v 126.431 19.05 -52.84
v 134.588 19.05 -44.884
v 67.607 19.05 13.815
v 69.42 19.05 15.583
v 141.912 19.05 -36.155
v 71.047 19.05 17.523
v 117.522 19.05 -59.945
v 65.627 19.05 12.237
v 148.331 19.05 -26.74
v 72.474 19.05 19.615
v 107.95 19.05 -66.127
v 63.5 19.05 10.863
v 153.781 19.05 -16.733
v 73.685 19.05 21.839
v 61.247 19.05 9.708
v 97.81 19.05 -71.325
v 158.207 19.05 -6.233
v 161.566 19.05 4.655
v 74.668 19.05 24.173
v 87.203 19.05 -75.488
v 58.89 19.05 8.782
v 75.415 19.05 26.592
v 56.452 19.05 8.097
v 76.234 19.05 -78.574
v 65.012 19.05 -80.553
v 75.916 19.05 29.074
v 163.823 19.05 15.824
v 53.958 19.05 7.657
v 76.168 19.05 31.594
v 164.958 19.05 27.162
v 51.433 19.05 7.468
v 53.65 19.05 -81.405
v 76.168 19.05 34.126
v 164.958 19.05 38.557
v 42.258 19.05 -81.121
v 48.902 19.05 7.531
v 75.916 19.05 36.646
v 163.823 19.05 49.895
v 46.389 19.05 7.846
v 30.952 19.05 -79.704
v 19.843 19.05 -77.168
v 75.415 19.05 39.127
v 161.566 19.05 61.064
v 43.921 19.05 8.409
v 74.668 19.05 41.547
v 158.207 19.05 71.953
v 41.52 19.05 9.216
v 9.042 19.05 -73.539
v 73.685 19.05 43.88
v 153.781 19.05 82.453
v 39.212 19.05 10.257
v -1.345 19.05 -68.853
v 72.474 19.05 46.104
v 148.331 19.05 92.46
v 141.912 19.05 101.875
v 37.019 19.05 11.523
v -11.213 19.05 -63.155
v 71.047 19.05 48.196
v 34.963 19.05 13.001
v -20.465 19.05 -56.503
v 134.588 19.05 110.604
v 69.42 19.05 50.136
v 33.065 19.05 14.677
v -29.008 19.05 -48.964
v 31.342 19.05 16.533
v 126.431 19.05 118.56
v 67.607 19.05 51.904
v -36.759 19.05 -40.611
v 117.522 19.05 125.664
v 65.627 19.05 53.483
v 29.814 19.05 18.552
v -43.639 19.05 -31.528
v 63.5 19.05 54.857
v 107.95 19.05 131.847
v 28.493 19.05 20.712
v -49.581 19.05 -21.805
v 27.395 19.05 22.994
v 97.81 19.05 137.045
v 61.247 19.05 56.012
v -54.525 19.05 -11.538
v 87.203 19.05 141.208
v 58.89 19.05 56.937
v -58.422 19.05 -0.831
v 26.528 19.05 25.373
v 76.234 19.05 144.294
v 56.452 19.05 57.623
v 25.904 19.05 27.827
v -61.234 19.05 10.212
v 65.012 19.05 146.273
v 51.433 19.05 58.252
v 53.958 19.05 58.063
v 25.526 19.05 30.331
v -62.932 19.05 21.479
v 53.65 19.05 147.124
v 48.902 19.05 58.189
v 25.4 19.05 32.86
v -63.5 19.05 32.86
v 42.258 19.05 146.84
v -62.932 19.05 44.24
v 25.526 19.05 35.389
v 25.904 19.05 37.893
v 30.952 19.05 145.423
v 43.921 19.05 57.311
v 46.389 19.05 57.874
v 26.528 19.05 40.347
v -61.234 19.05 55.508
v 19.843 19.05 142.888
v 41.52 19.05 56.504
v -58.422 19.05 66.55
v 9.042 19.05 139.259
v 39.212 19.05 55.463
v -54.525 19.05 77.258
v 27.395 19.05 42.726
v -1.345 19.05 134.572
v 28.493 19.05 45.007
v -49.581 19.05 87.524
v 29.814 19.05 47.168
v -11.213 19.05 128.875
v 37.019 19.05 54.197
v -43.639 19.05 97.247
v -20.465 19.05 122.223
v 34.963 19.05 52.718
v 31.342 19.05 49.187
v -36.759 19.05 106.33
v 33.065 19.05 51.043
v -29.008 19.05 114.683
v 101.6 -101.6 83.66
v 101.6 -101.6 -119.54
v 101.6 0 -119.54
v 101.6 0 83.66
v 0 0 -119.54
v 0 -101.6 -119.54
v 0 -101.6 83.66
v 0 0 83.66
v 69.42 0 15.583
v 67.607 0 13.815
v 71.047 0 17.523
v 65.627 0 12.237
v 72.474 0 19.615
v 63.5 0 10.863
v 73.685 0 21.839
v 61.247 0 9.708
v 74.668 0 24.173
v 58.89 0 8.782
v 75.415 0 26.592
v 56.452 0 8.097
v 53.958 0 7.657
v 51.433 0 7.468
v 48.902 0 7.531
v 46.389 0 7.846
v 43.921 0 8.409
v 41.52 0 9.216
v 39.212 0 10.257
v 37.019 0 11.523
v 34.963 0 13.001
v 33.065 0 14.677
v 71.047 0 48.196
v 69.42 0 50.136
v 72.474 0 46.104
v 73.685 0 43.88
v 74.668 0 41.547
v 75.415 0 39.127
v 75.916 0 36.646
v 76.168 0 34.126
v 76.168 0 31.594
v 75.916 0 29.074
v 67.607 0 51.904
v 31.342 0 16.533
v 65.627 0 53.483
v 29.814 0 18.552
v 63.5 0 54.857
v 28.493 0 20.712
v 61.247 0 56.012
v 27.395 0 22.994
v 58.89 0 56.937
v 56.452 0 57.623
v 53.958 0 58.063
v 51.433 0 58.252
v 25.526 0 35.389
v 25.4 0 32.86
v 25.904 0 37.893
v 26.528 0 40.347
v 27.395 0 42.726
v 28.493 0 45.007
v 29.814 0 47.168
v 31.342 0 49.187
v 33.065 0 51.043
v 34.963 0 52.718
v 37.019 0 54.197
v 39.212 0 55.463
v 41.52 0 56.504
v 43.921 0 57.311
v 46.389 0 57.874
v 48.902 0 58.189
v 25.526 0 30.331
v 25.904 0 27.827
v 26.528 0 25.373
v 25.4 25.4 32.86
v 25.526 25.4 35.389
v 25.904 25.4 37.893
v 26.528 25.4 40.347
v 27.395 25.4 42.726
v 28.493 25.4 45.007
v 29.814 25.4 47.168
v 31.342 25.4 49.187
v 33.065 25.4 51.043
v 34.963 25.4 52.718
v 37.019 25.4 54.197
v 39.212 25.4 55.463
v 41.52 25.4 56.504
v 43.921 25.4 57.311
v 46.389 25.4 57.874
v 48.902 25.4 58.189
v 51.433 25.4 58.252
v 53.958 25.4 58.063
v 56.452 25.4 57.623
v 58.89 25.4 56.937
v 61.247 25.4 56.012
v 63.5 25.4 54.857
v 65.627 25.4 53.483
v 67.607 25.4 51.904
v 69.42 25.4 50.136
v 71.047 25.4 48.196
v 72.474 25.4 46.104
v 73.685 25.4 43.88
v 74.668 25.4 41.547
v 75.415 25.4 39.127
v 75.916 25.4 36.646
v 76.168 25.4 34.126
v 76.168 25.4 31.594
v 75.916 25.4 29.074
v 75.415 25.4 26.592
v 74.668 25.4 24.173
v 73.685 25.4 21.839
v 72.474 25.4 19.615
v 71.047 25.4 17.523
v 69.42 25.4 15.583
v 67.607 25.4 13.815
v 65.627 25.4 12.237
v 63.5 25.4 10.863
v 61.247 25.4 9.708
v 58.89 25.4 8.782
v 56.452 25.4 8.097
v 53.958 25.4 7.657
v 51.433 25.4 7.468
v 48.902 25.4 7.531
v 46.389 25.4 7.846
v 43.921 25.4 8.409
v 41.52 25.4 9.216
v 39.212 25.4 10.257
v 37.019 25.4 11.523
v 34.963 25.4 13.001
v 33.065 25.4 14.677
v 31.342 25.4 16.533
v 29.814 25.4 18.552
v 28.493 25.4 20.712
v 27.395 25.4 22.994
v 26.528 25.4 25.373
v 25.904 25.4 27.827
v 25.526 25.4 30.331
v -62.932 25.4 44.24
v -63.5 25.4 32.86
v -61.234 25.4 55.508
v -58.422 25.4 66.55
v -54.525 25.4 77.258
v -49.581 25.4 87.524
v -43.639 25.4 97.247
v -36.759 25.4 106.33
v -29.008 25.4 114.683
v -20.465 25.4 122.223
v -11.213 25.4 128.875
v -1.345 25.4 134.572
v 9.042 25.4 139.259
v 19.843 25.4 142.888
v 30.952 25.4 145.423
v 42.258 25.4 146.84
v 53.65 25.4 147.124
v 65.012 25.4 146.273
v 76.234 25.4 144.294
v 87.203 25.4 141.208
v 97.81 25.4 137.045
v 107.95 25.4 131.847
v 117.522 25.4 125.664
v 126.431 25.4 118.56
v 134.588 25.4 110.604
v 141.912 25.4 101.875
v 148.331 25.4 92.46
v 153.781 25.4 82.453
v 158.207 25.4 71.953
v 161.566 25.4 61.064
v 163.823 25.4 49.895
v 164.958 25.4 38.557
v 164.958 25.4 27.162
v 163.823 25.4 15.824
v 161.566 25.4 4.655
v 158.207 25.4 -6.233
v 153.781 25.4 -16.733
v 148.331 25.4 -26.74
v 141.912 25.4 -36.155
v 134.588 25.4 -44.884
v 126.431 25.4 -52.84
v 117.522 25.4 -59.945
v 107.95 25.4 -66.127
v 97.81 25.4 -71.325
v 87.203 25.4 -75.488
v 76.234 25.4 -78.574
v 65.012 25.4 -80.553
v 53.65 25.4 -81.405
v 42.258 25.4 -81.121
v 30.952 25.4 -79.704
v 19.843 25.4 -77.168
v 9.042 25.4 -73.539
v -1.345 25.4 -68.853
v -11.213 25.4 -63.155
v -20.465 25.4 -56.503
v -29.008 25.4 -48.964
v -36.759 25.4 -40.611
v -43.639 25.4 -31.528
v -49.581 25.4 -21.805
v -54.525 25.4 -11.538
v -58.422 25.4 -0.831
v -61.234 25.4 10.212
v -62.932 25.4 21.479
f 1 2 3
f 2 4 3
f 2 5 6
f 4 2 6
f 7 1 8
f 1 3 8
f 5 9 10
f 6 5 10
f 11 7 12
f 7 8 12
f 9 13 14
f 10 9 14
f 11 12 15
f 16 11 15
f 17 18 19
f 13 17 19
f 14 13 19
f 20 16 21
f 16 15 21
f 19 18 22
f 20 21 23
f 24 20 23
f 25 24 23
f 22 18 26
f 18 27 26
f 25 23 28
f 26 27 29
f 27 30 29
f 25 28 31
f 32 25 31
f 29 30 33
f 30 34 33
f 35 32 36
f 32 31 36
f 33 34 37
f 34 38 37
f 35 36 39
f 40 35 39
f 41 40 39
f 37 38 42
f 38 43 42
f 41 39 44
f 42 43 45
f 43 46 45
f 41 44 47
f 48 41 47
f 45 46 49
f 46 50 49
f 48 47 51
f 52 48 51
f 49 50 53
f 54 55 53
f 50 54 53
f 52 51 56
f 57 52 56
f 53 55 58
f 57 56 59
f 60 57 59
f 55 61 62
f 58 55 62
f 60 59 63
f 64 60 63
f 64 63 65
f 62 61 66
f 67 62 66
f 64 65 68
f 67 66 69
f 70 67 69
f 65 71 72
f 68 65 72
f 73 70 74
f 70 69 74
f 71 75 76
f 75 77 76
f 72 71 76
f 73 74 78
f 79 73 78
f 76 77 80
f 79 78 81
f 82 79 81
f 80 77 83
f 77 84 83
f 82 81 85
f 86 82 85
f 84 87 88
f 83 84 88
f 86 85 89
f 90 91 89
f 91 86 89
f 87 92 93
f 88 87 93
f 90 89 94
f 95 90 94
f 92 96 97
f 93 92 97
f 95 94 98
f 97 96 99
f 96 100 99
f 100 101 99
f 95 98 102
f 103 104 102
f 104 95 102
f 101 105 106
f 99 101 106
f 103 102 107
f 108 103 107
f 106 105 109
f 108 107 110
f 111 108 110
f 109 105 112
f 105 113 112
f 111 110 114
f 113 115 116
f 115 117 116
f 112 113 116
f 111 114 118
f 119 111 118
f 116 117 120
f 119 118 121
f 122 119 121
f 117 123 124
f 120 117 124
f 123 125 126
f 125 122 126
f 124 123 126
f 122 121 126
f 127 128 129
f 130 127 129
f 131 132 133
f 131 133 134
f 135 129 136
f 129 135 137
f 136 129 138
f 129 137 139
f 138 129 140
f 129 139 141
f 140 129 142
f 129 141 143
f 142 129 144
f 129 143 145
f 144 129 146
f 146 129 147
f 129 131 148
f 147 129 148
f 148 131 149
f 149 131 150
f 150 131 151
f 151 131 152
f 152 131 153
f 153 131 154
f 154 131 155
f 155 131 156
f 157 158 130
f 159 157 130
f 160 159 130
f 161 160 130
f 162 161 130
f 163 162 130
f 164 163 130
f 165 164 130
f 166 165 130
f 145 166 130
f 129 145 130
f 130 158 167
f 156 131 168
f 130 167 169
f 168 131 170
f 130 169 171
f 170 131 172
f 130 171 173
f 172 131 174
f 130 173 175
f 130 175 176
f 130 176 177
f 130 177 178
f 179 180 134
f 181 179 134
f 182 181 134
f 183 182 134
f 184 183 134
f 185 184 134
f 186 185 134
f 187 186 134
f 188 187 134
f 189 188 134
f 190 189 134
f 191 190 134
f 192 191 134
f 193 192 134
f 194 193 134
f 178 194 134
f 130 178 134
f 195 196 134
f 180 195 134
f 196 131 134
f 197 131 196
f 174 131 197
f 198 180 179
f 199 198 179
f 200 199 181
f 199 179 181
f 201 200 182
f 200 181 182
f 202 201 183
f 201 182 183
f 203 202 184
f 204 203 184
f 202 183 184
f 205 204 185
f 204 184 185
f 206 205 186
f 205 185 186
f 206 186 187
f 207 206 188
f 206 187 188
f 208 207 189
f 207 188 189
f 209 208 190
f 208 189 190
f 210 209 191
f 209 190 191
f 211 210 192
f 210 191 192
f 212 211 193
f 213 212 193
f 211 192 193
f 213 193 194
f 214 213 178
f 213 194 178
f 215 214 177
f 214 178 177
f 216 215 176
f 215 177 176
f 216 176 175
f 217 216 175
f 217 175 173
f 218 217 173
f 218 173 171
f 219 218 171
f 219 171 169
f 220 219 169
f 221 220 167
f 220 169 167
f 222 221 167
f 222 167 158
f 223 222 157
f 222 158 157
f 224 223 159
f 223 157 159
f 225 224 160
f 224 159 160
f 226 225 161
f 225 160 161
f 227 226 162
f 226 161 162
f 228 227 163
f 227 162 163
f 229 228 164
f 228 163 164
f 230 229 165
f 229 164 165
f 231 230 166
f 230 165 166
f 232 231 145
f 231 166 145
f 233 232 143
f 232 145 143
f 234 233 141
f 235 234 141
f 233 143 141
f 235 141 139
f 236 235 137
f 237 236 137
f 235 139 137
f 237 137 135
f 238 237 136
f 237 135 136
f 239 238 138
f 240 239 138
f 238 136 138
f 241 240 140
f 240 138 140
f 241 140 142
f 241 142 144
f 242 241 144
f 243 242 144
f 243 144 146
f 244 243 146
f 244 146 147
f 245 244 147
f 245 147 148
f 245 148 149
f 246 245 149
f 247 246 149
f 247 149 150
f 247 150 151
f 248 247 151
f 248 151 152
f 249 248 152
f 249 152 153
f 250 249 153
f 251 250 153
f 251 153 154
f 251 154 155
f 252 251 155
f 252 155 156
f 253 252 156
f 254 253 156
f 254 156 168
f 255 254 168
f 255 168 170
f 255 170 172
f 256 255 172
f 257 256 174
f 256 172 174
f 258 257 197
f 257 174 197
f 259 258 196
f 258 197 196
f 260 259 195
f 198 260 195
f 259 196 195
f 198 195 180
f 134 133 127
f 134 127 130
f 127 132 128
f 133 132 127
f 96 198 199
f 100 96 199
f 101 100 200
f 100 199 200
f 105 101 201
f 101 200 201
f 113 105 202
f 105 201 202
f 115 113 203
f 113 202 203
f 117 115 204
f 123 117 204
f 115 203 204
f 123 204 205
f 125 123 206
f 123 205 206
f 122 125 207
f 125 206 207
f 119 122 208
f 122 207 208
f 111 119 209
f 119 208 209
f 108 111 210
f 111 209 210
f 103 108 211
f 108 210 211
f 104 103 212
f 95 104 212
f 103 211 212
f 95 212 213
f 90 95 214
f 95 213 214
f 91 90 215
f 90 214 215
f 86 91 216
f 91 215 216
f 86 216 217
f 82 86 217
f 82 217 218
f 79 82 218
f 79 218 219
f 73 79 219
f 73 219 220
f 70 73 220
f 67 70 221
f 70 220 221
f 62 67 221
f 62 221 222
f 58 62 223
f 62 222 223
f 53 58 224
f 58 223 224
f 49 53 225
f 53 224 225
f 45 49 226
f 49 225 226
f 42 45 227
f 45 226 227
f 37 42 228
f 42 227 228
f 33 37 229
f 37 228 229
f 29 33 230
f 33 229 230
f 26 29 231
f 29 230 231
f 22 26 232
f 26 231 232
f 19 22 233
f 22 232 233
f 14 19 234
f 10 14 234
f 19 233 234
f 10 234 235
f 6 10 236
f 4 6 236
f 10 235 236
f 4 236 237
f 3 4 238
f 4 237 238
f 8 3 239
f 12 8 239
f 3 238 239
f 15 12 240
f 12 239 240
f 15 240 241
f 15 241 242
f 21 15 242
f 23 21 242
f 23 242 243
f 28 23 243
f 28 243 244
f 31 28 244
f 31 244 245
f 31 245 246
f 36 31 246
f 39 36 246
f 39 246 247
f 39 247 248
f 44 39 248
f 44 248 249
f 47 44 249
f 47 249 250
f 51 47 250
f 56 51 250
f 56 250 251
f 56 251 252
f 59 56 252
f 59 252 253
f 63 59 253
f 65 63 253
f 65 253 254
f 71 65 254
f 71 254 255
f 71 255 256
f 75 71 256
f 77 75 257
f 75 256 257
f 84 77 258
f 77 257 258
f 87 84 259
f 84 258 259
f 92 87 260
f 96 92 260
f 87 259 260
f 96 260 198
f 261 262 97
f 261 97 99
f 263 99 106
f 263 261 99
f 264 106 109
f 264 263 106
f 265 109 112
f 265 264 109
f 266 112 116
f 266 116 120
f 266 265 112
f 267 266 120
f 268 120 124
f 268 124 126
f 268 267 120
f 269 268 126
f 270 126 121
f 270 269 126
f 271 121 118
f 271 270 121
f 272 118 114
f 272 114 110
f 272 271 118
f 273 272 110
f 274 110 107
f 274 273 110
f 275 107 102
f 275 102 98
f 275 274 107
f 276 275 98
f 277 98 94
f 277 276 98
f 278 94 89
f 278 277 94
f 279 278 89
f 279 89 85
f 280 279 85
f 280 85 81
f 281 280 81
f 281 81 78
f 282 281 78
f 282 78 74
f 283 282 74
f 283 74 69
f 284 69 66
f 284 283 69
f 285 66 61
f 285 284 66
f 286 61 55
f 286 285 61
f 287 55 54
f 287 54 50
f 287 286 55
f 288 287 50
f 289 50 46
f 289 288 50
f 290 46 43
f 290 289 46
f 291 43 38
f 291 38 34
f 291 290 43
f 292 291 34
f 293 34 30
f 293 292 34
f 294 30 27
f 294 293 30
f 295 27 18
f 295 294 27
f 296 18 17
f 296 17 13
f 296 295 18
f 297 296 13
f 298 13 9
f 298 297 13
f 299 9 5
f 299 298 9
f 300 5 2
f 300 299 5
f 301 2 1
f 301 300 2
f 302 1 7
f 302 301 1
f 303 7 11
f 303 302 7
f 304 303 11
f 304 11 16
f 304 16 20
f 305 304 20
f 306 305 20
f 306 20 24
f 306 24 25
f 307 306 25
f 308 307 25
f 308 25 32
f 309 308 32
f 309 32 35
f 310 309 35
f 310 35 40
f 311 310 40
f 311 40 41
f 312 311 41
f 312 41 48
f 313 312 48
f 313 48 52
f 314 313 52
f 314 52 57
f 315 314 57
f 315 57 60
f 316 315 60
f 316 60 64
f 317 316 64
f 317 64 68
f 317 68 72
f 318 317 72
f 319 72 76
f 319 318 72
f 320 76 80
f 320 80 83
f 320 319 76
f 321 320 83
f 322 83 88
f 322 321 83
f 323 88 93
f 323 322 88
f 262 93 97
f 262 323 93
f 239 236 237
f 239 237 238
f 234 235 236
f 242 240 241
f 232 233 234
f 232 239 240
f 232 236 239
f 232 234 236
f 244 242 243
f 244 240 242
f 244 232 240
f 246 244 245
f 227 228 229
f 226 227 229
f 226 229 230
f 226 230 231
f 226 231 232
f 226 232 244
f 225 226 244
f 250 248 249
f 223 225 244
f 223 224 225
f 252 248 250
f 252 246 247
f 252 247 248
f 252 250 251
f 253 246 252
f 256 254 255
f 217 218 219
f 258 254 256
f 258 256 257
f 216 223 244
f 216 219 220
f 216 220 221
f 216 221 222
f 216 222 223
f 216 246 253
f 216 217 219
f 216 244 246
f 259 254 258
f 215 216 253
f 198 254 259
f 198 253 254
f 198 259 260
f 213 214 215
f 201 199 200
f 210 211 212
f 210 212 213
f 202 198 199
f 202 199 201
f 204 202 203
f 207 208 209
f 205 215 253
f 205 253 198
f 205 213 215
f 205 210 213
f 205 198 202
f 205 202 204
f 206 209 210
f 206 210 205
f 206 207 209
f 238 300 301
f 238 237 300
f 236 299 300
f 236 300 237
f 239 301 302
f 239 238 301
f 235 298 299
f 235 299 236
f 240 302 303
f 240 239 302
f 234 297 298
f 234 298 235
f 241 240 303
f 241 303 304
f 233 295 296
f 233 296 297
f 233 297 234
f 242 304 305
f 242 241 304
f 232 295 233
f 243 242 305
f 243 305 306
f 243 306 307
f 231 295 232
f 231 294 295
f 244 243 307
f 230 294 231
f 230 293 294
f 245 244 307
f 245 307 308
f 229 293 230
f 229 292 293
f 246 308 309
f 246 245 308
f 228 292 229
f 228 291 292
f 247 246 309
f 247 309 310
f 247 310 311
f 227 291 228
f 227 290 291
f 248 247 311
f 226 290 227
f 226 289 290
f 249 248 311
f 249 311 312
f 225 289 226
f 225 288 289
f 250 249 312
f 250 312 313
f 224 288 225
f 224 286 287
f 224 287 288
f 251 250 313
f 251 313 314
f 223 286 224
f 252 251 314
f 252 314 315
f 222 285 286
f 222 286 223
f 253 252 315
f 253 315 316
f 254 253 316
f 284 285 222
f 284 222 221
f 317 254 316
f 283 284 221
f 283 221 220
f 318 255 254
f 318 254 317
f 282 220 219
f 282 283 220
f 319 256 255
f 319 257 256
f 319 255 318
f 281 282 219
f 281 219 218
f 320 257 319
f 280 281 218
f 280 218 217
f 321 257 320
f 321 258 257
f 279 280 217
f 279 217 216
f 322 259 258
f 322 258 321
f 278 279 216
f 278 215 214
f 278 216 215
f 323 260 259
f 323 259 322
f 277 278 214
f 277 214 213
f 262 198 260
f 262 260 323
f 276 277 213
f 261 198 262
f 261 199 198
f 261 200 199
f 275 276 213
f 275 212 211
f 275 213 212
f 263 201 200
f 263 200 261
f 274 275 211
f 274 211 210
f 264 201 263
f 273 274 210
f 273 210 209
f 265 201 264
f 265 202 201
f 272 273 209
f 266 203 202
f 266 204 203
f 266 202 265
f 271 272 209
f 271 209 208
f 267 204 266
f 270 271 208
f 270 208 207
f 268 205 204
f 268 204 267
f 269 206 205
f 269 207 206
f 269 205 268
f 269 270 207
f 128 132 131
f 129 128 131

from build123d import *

# Parameters (mm, degrees)
F0_W     = 101.6
F0_H     = 203.2
F1_DEPTH = 101.6
F2_R     = 25.4
F3_DEPTH = 25.4
F4_R     = 114.3
F4_R_2   = 25.4
F5_DEPTH = 6.35


with BuildPart() as f1:
    # F0 (on Right) → F1 (new body)
    with BuildSketch(Plane.YZ):
        with Locations((-50.8, -17.940154)):
            Rectangle(F0_W, F0_H)
    extrude(amount=F1_DEPTH)

    # F2 (on face) → F3 (join)
    with BuildSketch(Plane(origin=(0, 0, 0), x_dir=(-1, 0, 0), z_dir=(0, 1, 0))):
        with Locations((-50.8, 32.859846)):
            Circle(F2_R)
    extrude(amount=F3_DEPTH)


with BuildPart() as f5:
    # F4 (on face) → F5 (new body)
    with BuildSketch(Plane(origin=(0, 25.4, 0), x_dir=(-1, 0, 0), z_dir=(0, 1, 0))):
        with Locations((-50.8, 32.859846)):
            Circle(F4_R)
        with Locations((-50.8, 32.859846)):
            Circle(F4_R_2, mode=Mode.SUBTRACT)
    extrude(amount=-F5_DEPTH)


solid = Compound([f1.part, f5.part])
